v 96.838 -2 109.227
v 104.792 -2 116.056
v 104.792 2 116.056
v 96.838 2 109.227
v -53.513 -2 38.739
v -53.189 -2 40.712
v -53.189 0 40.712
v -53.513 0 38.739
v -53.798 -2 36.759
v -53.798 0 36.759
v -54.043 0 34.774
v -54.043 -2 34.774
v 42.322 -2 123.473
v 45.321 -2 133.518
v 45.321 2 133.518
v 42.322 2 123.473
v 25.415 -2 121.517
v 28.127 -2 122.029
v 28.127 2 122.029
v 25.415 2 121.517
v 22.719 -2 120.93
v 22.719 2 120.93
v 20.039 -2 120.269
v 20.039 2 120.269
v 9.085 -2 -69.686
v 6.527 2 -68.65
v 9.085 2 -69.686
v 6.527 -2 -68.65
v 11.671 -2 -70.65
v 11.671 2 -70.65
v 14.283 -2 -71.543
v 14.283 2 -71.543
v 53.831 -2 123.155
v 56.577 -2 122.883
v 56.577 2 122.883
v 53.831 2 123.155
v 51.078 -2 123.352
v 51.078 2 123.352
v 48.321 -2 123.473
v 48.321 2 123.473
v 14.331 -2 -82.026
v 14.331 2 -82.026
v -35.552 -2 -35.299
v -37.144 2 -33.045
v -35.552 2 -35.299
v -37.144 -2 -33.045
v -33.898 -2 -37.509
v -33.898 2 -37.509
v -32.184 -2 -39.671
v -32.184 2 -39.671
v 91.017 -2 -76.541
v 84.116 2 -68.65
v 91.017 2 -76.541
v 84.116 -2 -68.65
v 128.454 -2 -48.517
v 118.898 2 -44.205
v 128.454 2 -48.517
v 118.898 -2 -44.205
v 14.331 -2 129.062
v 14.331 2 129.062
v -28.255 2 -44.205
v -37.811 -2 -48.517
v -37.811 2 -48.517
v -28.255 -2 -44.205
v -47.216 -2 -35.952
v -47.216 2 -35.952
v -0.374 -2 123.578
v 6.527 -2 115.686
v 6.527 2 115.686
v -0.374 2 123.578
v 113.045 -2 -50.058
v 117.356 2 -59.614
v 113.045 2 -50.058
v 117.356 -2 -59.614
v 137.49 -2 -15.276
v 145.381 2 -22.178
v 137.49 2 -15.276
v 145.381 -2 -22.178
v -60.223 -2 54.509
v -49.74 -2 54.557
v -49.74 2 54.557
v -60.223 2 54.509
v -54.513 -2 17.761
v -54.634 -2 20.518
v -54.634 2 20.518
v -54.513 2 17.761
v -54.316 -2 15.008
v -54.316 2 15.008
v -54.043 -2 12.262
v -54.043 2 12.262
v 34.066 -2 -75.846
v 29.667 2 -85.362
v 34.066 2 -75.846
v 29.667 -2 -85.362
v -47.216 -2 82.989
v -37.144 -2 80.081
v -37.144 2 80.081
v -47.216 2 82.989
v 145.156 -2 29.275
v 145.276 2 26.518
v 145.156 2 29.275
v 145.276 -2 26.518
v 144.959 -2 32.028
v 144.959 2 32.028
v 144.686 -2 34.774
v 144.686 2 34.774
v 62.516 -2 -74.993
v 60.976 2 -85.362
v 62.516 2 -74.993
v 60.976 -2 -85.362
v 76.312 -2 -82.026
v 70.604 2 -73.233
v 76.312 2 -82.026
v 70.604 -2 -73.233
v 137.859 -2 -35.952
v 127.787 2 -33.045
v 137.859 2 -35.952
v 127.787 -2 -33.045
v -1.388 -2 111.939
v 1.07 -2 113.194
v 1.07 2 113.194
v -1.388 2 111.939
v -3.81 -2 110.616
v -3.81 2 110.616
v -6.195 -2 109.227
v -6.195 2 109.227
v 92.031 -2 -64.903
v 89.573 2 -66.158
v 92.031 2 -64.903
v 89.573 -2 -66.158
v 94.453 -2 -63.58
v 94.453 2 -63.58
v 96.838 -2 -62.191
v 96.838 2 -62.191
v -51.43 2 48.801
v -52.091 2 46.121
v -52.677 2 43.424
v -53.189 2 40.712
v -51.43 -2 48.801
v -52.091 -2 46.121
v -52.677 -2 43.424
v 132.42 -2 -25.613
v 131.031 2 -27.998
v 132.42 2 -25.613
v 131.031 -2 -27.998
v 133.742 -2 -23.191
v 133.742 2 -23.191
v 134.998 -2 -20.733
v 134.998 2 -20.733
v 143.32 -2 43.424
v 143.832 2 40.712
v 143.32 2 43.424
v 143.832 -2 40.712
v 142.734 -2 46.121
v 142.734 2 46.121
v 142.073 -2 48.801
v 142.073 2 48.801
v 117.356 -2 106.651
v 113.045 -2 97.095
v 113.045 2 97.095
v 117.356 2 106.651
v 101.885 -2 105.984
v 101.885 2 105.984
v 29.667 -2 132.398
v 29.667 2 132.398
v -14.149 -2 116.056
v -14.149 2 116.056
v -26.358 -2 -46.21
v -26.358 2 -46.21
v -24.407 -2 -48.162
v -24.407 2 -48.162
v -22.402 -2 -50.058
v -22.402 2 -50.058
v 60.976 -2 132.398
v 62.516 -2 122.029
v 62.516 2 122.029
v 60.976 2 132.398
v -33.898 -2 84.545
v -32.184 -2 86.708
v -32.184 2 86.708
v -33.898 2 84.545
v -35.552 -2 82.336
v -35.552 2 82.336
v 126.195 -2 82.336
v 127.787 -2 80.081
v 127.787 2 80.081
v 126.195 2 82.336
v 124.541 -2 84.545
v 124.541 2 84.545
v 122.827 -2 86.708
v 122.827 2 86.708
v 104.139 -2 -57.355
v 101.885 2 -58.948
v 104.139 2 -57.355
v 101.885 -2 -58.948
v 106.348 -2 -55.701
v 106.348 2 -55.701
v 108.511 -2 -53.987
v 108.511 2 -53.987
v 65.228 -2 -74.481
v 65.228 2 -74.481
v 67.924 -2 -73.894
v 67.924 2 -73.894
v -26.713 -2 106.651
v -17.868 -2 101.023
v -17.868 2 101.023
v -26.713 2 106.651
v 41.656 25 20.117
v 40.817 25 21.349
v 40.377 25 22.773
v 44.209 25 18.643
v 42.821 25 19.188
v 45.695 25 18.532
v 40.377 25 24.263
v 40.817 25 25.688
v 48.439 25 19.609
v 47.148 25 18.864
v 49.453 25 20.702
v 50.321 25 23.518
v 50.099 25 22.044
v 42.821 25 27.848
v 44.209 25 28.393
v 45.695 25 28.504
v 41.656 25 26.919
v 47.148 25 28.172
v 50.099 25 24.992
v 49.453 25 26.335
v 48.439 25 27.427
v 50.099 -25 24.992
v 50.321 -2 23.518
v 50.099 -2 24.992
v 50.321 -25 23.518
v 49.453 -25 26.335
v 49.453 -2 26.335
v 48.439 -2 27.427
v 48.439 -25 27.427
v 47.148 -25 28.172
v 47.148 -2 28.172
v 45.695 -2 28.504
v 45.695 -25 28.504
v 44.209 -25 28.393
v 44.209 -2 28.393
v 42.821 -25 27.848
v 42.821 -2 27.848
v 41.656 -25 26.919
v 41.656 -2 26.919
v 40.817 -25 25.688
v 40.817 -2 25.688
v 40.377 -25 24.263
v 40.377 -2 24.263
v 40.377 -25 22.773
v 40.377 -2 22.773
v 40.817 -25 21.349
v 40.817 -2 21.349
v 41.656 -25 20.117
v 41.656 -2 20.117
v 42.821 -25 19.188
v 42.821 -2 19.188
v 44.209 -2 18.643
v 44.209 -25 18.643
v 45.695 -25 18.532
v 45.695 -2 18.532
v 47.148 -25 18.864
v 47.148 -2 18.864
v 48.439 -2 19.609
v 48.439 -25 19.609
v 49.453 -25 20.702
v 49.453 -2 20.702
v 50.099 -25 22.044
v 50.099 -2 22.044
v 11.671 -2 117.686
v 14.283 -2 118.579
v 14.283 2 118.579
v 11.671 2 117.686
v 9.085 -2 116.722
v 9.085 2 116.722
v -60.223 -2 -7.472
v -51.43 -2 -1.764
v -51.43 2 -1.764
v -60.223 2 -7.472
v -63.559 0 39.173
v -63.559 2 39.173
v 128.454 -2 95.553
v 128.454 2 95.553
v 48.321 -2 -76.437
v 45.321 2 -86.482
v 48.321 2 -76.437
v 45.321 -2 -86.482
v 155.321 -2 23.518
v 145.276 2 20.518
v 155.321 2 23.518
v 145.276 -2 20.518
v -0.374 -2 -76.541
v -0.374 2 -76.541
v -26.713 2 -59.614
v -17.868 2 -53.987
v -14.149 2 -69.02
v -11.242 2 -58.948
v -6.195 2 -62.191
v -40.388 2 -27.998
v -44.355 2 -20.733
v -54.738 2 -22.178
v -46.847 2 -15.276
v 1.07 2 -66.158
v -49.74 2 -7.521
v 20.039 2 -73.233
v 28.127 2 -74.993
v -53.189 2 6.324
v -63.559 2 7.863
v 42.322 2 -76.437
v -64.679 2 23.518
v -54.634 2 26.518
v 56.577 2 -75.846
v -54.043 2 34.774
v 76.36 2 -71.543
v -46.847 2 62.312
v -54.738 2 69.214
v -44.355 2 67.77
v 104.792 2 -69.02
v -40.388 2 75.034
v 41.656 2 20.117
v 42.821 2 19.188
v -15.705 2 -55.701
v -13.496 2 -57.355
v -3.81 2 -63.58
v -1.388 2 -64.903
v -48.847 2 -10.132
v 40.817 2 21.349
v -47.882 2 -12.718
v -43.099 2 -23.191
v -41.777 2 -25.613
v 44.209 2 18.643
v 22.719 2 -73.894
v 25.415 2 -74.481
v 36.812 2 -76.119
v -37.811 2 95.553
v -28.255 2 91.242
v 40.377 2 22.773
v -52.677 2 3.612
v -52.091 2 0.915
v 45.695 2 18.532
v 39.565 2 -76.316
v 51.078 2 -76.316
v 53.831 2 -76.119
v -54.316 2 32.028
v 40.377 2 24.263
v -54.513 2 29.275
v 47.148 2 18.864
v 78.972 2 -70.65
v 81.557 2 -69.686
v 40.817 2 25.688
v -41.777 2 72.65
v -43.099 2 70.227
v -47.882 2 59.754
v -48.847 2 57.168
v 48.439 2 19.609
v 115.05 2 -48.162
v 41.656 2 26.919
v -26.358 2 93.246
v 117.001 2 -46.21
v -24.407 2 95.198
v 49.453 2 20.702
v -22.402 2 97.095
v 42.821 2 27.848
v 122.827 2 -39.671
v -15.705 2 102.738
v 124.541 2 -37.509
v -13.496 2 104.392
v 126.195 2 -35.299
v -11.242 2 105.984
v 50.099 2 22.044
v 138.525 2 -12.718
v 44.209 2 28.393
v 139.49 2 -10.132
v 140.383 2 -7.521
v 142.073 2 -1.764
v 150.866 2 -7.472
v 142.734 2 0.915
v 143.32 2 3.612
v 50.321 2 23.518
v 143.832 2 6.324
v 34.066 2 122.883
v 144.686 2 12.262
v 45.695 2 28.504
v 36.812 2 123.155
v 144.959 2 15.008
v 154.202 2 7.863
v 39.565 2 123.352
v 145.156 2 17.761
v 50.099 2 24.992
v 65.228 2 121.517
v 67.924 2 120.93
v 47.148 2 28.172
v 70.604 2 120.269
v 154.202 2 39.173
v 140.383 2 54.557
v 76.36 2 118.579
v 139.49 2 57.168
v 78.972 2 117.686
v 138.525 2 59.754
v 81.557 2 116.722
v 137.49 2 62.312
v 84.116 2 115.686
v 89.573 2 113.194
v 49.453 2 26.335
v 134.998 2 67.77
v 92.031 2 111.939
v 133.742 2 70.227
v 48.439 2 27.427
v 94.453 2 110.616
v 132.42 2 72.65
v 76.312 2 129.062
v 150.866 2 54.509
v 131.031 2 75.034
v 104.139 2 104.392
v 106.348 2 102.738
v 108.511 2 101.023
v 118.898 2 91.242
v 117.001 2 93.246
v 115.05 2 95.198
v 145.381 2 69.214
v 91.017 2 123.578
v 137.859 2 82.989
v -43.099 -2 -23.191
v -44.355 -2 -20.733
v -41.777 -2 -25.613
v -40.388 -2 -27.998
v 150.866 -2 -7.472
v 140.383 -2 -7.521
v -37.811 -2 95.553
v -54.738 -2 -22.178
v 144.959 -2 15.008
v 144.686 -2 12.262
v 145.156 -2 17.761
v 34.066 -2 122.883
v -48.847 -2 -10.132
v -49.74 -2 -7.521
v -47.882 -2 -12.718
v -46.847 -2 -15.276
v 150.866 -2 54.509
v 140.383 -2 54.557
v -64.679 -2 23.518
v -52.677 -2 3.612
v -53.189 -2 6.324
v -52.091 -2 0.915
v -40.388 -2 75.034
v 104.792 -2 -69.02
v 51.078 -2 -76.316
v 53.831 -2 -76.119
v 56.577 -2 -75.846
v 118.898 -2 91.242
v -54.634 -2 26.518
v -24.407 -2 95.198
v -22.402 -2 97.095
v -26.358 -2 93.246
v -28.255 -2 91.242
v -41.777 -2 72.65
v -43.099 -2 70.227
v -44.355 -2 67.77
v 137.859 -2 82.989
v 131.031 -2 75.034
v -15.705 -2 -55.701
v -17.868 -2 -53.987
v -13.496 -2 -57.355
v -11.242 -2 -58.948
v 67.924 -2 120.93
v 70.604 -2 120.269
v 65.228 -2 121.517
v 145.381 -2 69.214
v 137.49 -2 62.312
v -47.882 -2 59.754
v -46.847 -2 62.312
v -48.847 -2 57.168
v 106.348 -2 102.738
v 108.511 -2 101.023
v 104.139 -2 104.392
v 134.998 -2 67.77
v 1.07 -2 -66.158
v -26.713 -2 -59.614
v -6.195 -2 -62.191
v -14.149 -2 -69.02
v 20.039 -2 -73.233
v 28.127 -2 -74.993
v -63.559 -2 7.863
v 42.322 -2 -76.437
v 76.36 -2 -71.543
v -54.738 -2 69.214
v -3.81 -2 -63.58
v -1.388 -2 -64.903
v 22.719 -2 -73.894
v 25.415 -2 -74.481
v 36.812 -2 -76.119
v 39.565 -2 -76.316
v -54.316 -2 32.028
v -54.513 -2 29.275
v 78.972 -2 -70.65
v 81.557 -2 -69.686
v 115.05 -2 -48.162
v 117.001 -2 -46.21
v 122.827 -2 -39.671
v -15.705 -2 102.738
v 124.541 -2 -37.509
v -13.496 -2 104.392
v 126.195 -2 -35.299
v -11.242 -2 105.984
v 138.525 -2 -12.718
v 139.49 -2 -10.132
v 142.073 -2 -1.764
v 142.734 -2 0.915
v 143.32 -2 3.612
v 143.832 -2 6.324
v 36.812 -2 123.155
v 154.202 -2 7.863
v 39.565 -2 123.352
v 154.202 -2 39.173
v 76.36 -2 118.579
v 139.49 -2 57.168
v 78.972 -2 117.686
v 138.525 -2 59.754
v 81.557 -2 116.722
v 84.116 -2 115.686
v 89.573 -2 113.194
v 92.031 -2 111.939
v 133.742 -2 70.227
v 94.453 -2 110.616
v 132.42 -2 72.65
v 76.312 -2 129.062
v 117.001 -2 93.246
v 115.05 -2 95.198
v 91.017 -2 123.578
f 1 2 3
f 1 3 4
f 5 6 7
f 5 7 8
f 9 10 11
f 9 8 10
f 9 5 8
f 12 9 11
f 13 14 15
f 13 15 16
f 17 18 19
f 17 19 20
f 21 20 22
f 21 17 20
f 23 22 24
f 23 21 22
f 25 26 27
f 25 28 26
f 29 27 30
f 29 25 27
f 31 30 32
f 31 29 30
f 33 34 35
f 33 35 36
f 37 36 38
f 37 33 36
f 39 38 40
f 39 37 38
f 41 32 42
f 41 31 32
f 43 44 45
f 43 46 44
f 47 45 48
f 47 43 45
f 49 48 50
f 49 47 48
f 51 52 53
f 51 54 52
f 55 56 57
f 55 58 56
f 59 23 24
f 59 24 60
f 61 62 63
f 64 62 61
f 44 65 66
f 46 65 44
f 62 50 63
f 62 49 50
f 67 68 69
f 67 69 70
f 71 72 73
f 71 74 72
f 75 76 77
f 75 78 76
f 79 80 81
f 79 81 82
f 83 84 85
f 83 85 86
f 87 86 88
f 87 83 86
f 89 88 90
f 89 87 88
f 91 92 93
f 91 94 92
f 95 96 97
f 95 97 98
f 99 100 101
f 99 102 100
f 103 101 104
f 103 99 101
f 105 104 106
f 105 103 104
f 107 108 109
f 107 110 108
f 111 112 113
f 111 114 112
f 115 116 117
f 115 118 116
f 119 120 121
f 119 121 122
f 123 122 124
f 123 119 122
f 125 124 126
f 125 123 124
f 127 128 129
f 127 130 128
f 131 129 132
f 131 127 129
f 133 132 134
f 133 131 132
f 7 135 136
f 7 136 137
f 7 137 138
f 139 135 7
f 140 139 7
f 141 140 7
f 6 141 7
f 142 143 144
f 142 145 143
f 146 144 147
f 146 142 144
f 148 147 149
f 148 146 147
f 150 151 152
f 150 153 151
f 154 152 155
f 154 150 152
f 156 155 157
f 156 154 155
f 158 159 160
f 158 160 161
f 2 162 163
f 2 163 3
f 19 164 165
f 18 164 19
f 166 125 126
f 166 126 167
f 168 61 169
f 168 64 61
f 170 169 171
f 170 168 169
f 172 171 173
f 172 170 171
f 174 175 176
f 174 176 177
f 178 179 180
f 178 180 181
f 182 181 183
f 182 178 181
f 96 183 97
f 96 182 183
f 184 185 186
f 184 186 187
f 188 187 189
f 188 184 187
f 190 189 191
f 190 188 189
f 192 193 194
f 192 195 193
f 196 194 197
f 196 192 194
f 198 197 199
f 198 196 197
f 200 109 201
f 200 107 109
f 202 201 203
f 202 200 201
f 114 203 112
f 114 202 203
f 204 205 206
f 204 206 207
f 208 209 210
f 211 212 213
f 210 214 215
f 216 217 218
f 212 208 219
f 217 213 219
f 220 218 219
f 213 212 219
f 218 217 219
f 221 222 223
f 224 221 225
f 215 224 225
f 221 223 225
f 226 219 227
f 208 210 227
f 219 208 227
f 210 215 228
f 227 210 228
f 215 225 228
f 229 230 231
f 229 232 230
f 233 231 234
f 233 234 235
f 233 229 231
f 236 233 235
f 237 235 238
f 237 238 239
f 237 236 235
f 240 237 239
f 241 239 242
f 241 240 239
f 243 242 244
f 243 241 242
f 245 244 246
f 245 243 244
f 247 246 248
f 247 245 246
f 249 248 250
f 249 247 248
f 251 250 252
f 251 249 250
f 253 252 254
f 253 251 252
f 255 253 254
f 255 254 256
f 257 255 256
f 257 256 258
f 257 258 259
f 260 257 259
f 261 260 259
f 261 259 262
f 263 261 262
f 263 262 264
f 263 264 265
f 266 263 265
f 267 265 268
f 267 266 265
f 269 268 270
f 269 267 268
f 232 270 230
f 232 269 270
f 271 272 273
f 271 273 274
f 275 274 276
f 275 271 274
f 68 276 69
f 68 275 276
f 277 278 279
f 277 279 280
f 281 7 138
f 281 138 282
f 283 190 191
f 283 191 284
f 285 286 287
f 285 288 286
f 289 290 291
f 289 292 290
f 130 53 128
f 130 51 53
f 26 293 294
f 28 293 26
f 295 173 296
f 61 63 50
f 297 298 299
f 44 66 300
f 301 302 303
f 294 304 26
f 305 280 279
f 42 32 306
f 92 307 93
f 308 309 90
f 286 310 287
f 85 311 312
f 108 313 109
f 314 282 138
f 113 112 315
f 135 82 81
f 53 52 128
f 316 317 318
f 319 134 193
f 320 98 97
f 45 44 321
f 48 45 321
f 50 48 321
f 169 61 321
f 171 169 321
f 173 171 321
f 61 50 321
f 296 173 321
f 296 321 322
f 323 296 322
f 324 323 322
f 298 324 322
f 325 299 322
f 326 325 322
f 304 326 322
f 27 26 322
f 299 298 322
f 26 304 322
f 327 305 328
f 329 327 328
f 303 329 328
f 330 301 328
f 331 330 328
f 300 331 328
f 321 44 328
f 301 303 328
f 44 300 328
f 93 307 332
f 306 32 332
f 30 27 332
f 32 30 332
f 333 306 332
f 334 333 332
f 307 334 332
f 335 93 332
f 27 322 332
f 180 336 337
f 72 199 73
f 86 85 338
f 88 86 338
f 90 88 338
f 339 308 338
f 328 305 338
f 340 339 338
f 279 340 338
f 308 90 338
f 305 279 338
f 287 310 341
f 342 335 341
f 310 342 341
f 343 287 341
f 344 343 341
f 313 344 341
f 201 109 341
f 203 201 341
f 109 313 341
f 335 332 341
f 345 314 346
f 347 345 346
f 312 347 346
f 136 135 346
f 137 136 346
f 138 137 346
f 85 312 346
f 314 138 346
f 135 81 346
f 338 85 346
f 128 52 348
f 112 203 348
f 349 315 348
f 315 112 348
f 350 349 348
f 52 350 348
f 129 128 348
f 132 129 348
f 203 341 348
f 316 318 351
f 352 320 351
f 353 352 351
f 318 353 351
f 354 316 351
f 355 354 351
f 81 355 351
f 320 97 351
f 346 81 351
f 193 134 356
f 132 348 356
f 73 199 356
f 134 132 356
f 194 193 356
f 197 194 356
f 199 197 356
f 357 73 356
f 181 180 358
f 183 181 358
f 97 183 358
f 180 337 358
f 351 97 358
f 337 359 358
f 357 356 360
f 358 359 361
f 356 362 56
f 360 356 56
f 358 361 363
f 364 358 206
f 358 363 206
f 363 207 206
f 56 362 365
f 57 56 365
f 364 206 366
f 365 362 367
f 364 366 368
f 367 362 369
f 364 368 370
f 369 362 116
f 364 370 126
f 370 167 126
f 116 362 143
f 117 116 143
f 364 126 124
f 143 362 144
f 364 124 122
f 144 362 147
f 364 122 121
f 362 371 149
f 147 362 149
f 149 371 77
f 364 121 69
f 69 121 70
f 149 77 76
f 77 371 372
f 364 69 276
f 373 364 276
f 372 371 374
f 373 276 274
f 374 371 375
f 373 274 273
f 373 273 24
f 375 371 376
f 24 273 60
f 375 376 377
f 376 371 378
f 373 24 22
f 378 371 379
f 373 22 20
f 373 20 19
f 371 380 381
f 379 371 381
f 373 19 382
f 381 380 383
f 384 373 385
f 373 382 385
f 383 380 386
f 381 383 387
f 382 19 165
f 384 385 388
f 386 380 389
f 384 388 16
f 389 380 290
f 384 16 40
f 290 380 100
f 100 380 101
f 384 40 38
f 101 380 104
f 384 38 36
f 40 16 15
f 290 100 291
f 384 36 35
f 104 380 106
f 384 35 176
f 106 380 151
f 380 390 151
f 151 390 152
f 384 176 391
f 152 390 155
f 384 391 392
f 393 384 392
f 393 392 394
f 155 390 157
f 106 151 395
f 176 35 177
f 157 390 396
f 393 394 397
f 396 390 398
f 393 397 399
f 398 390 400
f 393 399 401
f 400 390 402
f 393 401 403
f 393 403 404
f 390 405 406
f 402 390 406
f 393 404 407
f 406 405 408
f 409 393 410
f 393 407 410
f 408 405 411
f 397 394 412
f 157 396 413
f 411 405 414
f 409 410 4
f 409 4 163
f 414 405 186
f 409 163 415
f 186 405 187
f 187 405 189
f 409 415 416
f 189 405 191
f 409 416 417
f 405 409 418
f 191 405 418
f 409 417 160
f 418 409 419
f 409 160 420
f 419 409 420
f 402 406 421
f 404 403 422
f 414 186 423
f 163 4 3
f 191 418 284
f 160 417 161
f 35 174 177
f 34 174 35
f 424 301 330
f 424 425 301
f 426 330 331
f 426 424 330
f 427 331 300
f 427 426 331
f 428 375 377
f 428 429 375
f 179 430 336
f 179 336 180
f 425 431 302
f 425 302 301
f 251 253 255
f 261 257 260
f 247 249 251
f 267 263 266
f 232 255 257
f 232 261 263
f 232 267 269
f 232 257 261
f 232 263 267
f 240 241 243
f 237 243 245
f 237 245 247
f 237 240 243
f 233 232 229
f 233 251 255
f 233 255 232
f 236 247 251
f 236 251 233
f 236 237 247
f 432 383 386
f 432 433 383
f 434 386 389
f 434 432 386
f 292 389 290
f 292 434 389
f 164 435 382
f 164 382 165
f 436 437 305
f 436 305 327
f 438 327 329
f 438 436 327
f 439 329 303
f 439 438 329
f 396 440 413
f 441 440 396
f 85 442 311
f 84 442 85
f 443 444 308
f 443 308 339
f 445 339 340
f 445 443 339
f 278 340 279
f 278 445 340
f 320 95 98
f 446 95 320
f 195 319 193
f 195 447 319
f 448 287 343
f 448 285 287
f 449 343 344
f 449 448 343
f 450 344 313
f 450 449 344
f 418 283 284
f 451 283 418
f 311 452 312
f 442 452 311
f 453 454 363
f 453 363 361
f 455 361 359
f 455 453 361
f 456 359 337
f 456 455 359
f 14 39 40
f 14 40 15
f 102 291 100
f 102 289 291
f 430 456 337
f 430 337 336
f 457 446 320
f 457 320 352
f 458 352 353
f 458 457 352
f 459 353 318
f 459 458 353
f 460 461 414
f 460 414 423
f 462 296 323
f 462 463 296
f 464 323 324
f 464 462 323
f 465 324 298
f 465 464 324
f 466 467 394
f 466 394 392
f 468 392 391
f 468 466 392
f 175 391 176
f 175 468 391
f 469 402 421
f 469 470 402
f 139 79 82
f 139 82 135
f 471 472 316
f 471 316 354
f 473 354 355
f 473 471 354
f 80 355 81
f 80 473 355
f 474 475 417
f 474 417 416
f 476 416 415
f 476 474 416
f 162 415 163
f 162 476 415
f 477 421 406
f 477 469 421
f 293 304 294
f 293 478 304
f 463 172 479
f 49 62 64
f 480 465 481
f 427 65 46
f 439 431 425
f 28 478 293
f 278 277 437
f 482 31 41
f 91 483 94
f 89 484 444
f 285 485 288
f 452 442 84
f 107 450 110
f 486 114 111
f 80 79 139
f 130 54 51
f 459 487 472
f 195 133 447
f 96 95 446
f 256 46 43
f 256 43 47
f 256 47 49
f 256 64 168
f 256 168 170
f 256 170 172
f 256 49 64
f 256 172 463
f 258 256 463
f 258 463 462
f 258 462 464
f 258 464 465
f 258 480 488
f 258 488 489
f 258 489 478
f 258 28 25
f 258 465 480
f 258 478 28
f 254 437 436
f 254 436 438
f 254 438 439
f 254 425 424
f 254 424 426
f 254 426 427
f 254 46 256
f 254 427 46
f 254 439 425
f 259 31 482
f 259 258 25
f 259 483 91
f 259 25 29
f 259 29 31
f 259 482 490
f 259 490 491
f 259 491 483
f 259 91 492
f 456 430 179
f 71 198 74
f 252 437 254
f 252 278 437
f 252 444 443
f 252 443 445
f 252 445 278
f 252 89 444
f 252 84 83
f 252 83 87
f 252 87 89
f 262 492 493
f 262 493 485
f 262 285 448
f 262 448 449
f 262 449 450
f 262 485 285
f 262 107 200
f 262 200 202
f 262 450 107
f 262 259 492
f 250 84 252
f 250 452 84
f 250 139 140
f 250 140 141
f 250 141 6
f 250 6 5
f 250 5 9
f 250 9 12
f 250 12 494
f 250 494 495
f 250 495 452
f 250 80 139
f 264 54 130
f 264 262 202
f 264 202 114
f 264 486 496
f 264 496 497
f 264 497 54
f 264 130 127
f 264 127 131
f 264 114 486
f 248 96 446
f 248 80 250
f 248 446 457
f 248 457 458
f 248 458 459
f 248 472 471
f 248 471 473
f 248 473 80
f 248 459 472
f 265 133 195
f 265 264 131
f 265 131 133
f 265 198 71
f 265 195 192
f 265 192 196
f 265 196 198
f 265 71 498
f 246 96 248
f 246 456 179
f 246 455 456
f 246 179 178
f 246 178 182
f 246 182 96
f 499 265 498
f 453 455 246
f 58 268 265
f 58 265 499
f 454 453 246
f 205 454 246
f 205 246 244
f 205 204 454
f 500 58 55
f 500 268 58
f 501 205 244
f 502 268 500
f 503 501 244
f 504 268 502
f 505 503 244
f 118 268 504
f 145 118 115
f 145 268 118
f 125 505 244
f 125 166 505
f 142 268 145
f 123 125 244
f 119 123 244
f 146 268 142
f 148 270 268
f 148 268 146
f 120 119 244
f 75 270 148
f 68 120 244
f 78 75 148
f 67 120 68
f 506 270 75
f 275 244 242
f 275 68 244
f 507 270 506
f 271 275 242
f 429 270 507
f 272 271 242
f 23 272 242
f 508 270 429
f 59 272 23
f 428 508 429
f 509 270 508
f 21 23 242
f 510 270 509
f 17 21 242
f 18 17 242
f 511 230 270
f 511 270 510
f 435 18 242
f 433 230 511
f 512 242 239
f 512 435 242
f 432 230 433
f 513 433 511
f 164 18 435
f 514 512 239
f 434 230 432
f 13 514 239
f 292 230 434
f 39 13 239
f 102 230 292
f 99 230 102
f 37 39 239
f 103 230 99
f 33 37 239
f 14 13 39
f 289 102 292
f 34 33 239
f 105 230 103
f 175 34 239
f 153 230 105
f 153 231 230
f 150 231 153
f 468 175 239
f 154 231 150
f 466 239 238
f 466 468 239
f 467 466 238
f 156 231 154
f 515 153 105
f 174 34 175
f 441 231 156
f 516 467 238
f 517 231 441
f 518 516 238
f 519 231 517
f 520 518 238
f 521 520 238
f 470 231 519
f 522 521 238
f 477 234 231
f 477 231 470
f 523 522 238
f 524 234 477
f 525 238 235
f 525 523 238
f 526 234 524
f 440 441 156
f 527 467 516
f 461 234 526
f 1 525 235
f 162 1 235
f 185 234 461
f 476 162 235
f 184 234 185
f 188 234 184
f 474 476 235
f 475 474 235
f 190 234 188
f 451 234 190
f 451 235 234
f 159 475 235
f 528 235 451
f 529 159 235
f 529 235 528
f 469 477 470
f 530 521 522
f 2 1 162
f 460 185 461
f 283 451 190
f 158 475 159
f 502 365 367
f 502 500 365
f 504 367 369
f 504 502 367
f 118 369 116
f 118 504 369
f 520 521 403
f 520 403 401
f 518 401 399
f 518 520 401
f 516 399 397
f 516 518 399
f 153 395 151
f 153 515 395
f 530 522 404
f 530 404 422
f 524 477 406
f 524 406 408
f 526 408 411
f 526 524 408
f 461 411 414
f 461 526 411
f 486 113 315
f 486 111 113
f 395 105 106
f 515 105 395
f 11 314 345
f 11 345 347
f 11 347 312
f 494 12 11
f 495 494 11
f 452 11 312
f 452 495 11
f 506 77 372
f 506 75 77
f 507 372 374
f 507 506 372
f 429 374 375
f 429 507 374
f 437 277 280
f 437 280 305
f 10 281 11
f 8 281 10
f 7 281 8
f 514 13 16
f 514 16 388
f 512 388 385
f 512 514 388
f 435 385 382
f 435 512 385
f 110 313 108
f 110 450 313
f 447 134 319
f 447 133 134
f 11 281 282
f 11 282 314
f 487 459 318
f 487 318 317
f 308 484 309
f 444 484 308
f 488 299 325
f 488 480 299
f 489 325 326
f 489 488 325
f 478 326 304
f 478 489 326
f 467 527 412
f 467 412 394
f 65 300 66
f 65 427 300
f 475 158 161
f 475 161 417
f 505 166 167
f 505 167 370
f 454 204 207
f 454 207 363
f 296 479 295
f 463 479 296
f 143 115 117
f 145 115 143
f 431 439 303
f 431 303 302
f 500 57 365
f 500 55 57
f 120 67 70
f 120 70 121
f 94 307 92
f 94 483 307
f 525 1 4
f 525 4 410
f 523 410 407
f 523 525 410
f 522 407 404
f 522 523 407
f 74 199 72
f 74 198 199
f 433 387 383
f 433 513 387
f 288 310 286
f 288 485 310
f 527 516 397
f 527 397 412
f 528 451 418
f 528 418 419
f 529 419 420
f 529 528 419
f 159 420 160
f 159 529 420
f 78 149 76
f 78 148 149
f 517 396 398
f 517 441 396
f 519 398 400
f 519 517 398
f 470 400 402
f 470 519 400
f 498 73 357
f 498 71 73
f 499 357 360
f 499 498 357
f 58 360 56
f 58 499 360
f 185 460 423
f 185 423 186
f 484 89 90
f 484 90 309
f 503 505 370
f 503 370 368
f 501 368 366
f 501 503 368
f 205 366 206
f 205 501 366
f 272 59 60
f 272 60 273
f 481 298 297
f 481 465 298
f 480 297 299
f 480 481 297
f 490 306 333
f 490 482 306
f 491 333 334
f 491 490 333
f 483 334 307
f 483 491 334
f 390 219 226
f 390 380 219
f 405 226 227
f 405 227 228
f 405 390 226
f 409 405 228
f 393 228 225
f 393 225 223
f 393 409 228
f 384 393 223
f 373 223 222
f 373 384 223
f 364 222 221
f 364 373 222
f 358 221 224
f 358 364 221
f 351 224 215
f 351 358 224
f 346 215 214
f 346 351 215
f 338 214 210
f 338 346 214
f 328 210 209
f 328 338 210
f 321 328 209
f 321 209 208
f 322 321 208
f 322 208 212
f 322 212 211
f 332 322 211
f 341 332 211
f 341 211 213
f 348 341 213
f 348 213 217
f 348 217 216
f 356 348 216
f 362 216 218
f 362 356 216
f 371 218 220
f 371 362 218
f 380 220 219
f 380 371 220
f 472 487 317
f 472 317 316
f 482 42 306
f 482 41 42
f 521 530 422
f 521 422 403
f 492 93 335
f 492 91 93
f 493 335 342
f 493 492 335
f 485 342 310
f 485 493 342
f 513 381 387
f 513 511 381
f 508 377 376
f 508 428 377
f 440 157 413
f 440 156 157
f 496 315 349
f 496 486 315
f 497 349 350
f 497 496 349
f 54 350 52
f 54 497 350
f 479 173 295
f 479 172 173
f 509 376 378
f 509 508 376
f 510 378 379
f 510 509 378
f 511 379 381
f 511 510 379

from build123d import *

# Parameters (mm, degrees)
F0_R          = 5
F1_DEPTH      = 25
F1_DEPTH_BACK = 25
F2_DEPTH      = 2
F2_DEPTH_BACK = 2
F3_DEPTH      = 2


with BuildPart() as f1:
    # F0 (on Front) → F1 (new body, two sides)
    with BuildSketch(Plane.XZ) as f1_sk:
        with Locations((45.321487, 23.518129)):
            Circle(F0_R)
    extrude(amount=F1_DEPTH)
    extrude(f1_sk.sketch, amount=-F1_DEPTH_BACK)

    # F0 (on Front) → F2 (join, two sides)
    with BuildSketch(Plane.XZ) as f2_sk:
        with BuildLine():
            Line((145.381006, 69.213781), (134.997648, 67.769526))
            ThreePointArc((134.997648, 67.769526), (133.089386, 71.443028), (131.030724, 75.034405))
            Line((131.030724, 75.034405), (137.859376, 82.988619))
            Line((137.859376, 82.988619), (127.787244, 80.081359))
            ThreePointArc((127.787244, 80.081359), (125.375611, 83.445896), (122.826797, 86.70774))
            Line((122.826797, 86.70774), (128.45394, 95.55281))
            Line((128.45394, 95.55281), (118.898074, 91.241727))
            ThreePointArc((118.898074, 91.241727), (116.032165, 94.228807), (113.045085, 97.094717))
            Line((113.045085, 97.094717), (117.356168, 106.650582))
            Line((117.356168, 106.650582), (108.511098, 101.023439))
            ThreePointArc((108.511098, 101.023439), (105.249254, 103.572253), (101.884716, 105.983886))
            Line((101.884716, 105.983886), (104.791977, 116.056018))
            Line((104.791977, 116.056018), (96.837763, 109.227366))
            ThreePointArc((96.837763, 109.227366), (93.246386, 111.286028), (89.572883, 113.19429))
            Line((89.572883, 113.19429), (91.017138, 123.577649))
            Line((91.017138, 123.577649), (84.115706, 115.6865))
            ThreePointArc((84.115706, 115.6865), (80.267905, 117.213102), (76.36022, 118.579147))
            Line((76.36022, 118.579147), (76.312068, 129.062356))
            Line((76.312068, 129.062356), (70.60391, 120.269352))
            ThreePointArc((70.60391, 120.269352), (66.578016, 121.232816), (62.515697, 122.028835))
            Line((62.515697, 122.028835), (60.976119, 132.398488))
            Line((60.976119, 132.398488), (56.577436, 122.882628))
            ThreePointArc((56.577436, 122.882628), (52.455405, 123.263341), (48.321149, 123.473129))
            Line((48.321149, 123.473129), (45.321487, 133.518129))
            Line((45.321487, 133.518129), (42.321824, 123.473129))
            ThreePointArc((42.321824, 123.473129), (38.187569, 123.263341), (34.065537, 122.882628))
            Line((34.065537, 122.882628), (29.666855, 132.398488))
            Line((29.666855, 132.398488), (28.127277, 122.028835))
            ThreePointArc((28.127277, 122.028835), (24.064958, 121.232816), (20.039064, 120.269352))
            Line((20.039064, 120.269352), (14.330906, 129.062356))
            Line((14.330906, 129.062356), (14.282754, 118.579147))
            ThreePointArc((14.282754, 118.579147), (10.375069, 117.213102), (6.527268, 115.6865))
            Line((6.527268, 115.6865), (-0.374165, 123.577649))
            Line((-0.374165, 123.577649), (1.07009, 113.19429))
            ThreePointArc((1.07009, 113.19429), (-2.603412, 111.286028), (-6.194789, 109.227366))
            Line((-6.194789, 109.227366), (-14.149003, 116.056018))
            Line((-14.149003, 116.056018), (-11.241743, 105.983886))
            ThreePointArc((-11.241743, 105.983886), (-14.60628, 103.572253), (-17.868124, 101.023439))
            Line((-17.868124, 101.023439), (-26.713194, 106.650582))
            Line((-26.713194, 106.650582), (-22.402111, 97.094717))
            ThreePointArc((-22.402111, 97.094717), (-25.389191, 94.228807), (-28.255101, 91.241727))
            Line((-28.255101, 91.241727), (-37.810966, 95.55281))
            Line((-37.810966, 95.55281), (-32.183823, 86.70774))
            ThreePointArc((-32.183823, 86.70774), (-34.732637, 83.445896), (-37.14427, 80.081359))
            Line((-37.14427, 80.081359), (-47.216402, 82.988619))
            Line((-47.216402, 82.988619), (-40.38775, 75.034405))
            ThreePointArc((-40.38775, 75.034405), (-42.446412, 71.443028), (-44.354674, 67.769526))
            Line((-44.354674, 67.769526), (-54.738033, 69.213781))
            Line((-54.738033, 69.213781), (-46.846884, 62.312348))
            ThreePointArc((-46.846884, 62.312348), (-48.373486, 58.464547), (-49.739531, 54.556862))
            Line((-49.739531, 54.556862), (-60.22274, 54.50871))
            Line((-60.22274, 54.50871), (-51.429736, 48.800552))
            ThreePointArc((-51.429736, 48.800552), (-52.3932, 44.774658), (-53.189219, 40.712339))
            ThreePointArc((-53.189219, 40.712339), (-53.660657, 37.749613), (-54.043012, 34.774078))
            ThreePointArc((-54.043012, 34.774078), (-54.423725, 30.652047), (-54.633513, 26.517792))
            Line((-54.633513, 26.517792), (-64.678513, 23.518129))
            Line((-64.678513, 23.518129), (-54.633513, 20.518467))
            ThreePointArc((-54.633513, 20.518467), (-54.423725, 16.384211), (-54.043012, 12.26218))
            Line((-54.043012, 12.26218), (-63.558872, 7.863497))
            Line((-63.558872, 7.863497), (-53.189219, 6.323919))
            ThreePointArc((-53.189219, 6.323919), (-52.3932, 2.2616), (-51.429736, -1.764294))
            Line((-51.429736, -1.764294), (-60.22274, -7.472452))
            Line((-60.22274, -7.472452), (-49.739531, -7.520604))
            ThreePointArc((-49.739531, -7.520604), (-48.373486, -11.428289), (-46.846884, -15.27609))
            Line((-46.846884, -15.27609), (-54.738033, -22.177522))
            Line((-54.738033, -22.177522), (-44.354674, -20.733268))
            ThreePointArc((-44.354674, -20.733268), (-42.446412, -24.40677), (-40.38775, -27.998147))
            Line((-40.38775, -27.998147), (-47.216402, -35.952361))
            Line((-47.216402, -35.952361), (-37.14427, -33.0451))
            ThreePointArc((-37.14427, -33.0451), (-34.732637, -36.409638), (-32.183823, -39.671482))
            Line((-32.183823, -39.671482), (-37.810966, -48.516552))
            Line((-37.810966, -48.516552), (-28.255101, -44.205469))
            ThreePointArc((-28.255101, -44.205469), (-25.389191, -47.192549), (-22.402111, -50.058458))
            Line((-22.402111, -50.058458), (-26.713194, -59.614324))
            Line((-26.713194, -59.614324), (-17.868124, -53.987181))
            ThreePointArc((-17.868124, -53.987181), (-14.60628, -56.535995), (-11.241743, -58.947628))
            Line((-11.241743, -58.947628), (-14.149003, -69.01976))
            Line((-14.149003, -69.01976), (-6.194789, -62.191108))
            ThreePointArc((-6.194789, -62.191108), (-2.603412, -64.24977), (1.07009, -66.158032))
            Line((1.07009, -66.158032), (-0.374165, -76.54139))
            Line((-0.374165, -76.54139), (6.527268, -68.650242))
            ThreePointArc((6.527268, -68.650242), (10.375069, -70.176843), (14.282754, -71.542889))
            Line((14.282754, -71.542889), (14.330906, -82.026098))
            Line((14.330906, -82.026098), (20.039064, -73.233094))
            ThreePointArc((20.039064, -73.233094), (24.064958, -74.196558), (28.127277, -74.992577))
            Line((28.127277, -74.992577), (29.666855, -85.36223))
            Line((29.666855, -85.36223), (34.065537, -75.84637))
            ThreePointArc((34.065537, -75.84637), (38.187569, -76.227082), (42.321824, -76.436871))
            Line((42.321824, -76.436871), (45.321487, -86.481871))
            Line((45.321487, -86.481871), (48.321149, -76.436871))
            ThreePointArc((48.321149, -76.436871), (52.455405, -76.227082), (56.577436, -75.84637))
            Line((56.577436, -75.84637), (60.976119, -85.36223))
            Line((60.976119, -85.36223), (62.515697, -74.992577))
            ThreePointArc((62.515697, -74.992577), (66.578016, -74.196558), (70.60391, -73.233094))
            Line((70.60391, -73.233094), (76.312068, -82.026098))
            Line((76.312068, -82.026098), (76.36022, -71.542889))
            ThreePointArc((76.36022, -71.542889), (80.267905, -70.176843), (84.115706, -68.650242))
            Line((84.115706, -68.650242), (91.017138, -76.54139))
            Line((91.017138, -76.54139), (89.572883, -66.158032))
            ThreePointArc((89.572883, -66.158032), (93.246386, -64.24977), (96.837763, -62.191108))
            Line((96.837763, -62.191108), (104.791977, -69.01976))
            Line((104.791977, -69.01976), (101.884716, -58.947628))
            ThreePointArc((101.884716, -58.947628), (105.249254, -56.535995), (108.511098, -53.987181))
            Line((108.511098, -53.987181), (117.356168, -59.614324))
            Line((117.356168, -59.614324), (113.045085, -50.058458))
            ThreePointArc((113.045085, -50.058458), (116.032165, -47.192549), (118.898074, -44.205469))
            Line((118.898074, -44.205469), (128.45394, -48.516552))
            Line((128.45394, -48.516552), (122.826797, -39.671482))
            ThreePointArc((122.826797, -39.671482), (125.375611, -36.409638), (127.787244, -33.0451))
            Line((127.787244, -33.0451), (137.859376, -35.952361))
            Line((137.859376, -35.952361), (131.030724, -27.998147))
            ThreePointArc((131.030724, -27.998147), (133.089386, -24.40677), (134.997648, -20.733268))
            Line((134.997648, -20.733268), (145.381006, -22.177522))
            Line((145.381006, -22.177522), (137.489858, -15.27609))
            ThreePointArc((137.489858, -15.27609), (139.016459, -11.428289), (140.382504, -7.520604))
            Line((140.382504, -7.520604), (150.865714, -7.472452))
            Line((150.865714, -7.472452), (142.07271, -1.764294))
            ThreePointArc((142.07271, -1.764294), (143.036173, 2.2616), (143.832193, 6.323919))
            Line((143.832193, 6.323919), (154.201845, 7.863497))
            Line((154.201845, 7.863497), (144.685986, 12.26218))
            ThreePointArc((144.685986, 12.26218), (145.066698, 16.384211), (145.276487, 20.518467))
            Line((145.276487, 20.518467), (155.321487, 23.518129))
            Line((155.321487, 23.518129), (145.276487, 26.517792))
            ThreePointArc((145.276487, 26.517792), (145.066698, 30.652047), (144.685986, 34.774078))
            Line((144.685986, 34.774078), (154.201845, 39.172761))
            Line((154.201845, 39.172761), (143.832193, 40.712339))
            ThreePointArc((143.832193, 40.712339), (143.036173, 44.774658), (142.07271, 48.800552))
            Line((142.07271, 48.800552), (150.865714, 54.50871))
            Line((150.865714, 54.50871), (140.382504, 54.556862))
            ThreePointArc((140.382504, 54.556862), (139.016459, 58.464547), (137.489858, 62.312348))
            Line((137.489858, 62.312348), (145.381006, 69.213781))
        make_face()
        with Locations((45.321487, 23.518129)):
            Circle(F0_R, mode=Mode.SUBTRACT)
    extrude(amount=F2_DEPTH)
    extrude(f2_sk.sketch, amount=-F2_DEPTH_BACK)

    # F0 (on Front) → F3 (join, through all)
    with BuildSketch(Plane.XZ):
        with BuildLine():
            Line((-53.189219, 40.712339), (-63.558872, 39.172761))
            Line((-63.558872, 39.172761), (-54.043012, 34.774078))
            ThreePointArc((-54.043012, 34.774078), (-53.660657, 37.749613), (-53.189219, 40.712339))
        make_face()
    extrude(amount=-F3_DEPTH)


solid = f1.part
